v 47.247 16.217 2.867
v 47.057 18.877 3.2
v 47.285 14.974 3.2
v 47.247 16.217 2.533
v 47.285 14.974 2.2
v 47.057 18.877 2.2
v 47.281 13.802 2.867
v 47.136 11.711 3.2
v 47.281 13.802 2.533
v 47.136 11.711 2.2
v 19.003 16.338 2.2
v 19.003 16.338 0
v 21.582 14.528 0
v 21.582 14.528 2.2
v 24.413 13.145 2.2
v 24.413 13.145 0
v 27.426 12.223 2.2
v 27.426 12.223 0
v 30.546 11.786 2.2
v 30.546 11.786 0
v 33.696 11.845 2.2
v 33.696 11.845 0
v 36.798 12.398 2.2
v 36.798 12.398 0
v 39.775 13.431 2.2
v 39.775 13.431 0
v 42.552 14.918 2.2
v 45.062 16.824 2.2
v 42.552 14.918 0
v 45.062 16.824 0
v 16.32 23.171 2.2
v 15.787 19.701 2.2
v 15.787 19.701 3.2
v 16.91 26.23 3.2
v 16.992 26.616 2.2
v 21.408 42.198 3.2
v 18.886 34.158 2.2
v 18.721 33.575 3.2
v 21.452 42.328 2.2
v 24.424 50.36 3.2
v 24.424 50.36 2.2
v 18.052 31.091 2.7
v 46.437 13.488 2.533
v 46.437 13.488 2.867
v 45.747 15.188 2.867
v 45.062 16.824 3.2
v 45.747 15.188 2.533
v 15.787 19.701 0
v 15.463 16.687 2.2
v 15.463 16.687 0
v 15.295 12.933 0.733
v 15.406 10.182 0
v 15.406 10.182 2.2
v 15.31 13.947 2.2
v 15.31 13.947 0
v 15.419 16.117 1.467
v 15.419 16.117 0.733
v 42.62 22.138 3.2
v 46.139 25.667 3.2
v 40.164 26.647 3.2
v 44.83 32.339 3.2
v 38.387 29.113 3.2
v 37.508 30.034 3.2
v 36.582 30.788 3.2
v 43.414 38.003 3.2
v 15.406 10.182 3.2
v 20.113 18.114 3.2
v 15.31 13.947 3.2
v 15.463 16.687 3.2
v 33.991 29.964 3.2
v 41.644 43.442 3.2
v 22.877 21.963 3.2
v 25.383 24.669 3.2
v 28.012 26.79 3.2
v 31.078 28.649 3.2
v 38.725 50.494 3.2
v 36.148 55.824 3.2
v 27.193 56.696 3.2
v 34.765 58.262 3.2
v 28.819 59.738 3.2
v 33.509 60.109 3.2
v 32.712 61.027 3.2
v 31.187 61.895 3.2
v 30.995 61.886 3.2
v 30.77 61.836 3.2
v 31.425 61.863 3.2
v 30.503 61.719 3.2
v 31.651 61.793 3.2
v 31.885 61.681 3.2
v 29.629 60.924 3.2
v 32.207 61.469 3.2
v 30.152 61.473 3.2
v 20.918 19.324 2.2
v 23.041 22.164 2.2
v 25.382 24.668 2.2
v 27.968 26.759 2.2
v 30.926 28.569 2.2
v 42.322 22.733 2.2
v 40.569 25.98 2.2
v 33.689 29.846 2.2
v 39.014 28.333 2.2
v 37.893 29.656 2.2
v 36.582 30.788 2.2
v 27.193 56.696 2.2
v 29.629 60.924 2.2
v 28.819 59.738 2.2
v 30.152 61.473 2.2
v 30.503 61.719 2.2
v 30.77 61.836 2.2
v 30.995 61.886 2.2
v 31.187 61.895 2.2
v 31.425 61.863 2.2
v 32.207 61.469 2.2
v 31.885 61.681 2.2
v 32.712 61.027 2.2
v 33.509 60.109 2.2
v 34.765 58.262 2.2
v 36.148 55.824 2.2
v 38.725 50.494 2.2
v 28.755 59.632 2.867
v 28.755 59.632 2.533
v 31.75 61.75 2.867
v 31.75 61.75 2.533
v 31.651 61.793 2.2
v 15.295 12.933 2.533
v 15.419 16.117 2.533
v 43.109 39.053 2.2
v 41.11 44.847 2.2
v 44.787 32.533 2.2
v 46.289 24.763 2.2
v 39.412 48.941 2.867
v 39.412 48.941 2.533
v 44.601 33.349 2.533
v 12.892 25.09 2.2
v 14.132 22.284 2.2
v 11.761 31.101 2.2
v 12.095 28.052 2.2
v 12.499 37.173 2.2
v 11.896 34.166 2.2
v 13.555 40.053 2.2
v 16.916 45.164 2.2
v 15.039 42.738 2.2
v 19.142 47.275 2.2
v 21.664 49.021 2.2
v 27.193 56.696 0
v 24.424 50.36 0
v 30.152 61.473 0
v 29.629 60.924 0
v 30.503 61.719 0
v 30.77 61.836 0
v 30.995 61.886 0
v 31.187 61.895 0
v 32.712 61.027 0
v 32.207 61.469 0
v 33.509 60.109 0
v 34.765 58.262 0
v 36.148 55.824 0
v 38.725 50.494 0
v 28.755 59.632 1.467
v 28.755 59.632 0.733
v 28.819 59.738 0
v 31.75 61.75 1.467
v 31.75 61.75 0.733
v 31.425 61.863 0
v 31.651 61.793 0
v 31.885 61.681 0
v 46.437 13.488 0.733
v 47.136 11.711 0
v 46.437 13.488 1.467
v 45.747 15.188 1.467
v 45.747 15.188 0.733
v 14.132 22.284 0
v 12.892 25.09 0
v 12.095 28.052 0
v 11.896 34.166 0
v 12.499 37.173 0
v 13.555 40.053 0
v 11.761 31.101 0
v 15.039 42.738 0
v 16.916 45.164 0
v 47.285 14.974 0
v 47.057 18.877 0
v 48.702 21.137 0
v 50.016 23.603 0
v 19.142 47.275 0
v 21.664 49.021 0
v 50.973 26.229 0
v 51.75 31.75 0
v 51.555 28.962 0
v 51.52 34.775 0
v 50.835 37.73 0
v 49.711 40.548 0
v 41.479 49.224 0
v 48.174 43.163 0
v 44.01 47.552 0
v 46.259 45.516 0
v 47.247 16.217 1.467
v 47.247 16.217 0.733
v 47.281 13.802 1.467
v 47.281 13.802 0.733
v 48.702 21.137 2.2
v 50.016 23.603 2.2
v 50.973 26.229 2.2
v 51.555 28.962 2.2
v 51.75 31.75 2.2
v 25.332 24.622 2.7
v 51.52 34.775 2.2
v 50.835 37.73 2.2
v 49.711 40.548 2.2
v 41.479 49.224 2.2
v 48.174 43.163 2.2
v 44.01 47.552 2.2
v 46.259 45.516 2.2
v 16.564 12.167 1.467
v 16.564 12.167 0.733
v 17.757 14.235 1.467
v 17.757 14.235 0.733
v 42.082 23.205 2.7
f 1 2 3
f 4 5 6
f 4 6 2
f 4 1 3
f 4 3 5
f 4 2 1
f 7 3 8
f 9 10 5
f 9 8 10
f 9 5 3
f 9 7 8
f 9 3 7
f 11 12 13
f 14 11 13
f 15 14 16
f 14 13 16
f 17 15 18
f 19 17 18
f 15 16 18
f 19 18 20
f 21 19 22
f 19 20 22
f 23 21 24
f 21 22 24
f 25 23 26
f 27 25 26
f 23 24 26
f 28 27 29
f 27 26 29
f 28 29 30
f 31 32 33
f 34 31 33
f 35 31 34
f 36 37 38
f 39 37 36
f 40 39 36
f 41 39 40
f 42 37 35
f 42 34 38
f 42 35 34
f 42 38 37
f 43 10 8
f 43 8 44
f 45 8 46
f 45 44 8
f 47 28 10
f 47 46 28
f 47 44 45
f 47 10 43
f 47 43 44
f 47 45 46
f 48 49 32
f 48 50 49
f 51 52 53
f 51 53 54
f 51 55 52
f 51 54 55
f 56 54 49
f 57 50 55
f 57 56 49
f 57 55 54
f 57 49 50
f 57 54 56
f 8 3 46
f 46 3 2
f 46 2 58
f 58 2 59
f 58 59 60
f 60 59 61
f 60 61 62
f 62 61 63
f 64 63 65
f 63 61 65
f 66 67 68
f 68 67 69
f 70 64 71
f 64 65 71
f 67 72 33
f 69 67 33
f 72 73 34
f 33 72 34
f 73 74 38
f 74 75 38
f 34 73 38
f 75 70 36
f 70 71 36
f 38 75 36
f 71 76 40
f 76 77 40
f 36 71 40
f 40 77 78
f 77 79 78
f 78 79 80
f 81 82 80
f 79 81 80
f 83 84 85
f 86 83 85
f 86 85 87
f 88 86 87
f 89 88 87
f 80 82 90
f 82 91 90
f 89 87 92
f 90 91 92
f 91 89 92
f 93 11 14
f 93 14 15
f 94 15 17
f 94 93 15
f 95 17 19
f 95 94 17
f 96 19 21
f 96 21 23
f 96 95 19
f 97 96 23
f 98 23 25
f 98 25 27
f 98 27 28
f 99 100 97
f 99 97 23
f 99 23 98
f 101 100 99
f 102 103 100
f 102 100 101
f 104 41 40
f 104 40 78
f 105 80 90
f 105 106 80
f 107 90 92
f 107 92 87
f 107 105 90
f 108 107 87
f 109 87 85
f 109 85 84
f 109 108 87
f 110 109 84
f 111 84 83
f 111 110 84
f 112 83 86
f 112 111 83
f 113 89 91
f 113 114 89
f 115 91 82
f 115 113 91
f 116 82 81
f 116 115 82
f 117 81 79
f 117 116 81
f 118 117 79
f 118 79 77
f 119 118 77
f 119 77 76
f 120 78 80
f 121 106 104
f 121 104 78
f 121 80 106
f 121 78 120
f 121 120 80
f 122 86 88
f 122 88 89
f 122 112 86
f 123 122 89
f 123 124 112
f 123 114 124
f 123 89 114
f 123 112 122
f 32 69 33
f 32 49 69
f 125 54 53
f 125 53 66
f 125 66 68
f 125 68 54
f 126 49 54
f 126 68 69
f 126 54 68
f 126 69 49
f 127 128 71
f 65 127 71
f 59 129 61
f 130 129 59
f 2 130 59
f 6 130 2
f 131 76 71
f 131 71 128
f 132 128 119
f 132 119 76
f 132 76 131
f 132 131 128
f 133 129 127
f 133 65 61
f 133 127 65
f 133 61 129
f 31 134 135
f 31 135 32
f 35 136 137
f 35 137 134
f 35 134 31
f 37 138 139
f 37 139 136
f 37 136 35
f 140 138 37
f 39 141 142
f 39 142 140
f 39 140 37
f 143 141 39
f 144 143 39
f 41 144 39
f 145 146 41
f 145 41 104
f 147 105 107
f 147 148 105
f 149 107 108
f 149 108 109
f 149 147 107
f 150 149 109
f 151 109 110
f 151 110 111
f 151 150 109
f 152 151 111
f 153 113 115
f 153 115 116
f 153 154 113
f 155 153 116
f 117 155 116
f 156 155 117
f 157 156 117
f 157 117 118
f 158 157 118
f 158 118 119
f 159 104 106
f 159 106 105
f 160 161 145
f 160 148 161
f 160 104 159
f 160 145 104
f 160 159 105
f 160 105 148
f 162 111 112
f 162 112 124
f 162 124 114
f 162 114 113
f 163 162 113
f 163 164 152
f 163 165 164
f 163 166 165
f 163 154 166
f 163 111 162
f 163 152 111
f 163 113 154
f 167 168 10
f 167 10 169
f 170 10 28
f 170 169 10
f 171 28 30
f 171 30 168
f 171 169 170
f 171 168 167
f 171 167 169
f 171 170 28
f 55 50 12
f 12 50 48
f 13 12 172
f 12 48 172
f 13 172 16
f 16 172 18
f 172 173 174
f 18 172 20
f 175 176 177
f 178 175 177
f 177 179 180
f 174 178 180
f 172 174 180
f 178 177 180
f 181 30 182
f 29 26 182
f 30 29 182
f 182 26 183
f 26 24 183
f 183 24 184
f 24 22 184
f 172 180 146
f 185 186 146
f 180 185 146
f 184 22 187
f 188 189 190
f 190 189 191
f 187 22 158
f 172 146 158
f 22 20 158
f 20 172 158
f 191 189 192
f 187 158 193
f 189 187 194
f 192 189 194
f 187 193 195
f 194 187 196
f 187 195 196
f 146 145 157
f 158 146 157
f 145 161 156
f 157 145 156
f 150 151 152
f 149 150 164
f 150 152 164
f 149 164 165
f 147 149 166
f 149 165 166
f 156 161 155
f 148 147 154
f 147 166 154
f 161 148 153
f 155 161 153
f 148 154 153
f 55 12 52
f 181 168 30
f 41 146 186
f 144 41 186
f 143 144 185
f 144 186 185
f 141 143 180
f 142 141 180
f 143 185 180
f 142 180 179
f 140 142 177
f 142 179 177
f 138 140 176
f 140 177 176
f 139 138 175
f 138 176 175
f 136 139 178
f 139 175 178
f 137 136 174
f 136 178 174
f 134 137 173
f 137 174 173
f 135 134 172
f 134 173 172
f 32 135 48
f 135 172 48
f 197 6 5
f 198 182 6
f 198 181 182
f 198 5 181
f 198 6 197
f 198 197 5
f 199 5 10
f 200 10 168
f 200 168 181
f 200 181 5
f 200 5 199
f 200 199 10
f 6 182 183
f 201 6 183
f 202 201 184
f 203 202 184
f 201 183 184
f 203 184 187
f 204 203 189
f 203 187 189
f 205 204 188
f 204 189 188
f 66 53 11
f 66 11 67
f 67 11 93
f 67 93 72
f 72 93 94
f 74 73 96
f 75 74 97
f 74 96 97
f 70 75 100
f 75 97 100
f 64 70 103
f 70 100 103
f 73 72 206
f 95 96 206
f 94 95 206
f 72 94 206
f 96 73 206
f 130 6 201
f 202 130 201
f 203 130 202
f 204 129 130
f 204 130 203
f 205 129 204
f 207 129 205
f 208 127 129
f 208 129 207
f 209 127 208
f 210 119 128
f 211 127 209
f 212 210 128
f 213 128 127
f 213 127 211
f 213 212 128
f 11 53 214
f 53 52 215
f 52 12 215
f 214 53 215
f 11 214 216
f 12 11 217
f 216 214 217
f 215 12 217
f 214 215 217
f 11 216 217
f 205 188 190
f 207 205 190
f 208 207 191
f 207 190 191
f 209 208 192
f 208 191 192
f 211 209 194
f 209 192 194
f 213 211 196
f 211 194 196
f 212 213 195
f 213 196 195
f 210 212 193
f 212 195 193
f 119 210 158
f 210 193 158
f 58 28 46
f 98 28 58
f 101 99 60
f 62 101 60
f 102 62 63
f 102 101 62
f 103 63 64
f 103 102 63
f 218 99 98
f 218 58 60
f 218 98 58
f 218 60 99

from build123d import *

# Parameters (mm, degrees)
F1_DEPTH = 2.2
F2_DEPTH = 3.2


with BuildPart() as f1:
    # F0 (on Top) → F1 (new body)
    with BuildSketch(Plane.XY):
        with BuildLine():
            ThreePointArc((47.0567276318, 18.8773899614), (50.5400845213, 24.8992537865), (51.75, 31.75))
            ThreePointArc((51.75, 31.75), (48.1739643306, 43.1628609764), (38.7246604334, 50.4944421586))
            add(Edge.make_bspline(
                [(38.7246604334, 50.4944421586), (38.9609346181, 49.9686786288), (41.6774554399, 43.8176291657), (44.2250191929, 36.4340414246), (46.6159564174, 23.5665925252), (47.0567276318, 18.8773899614)],
                knots=[0.630442373, 0.630442373, 0.630442373, 0.630442373, 0.6456439018, 0.8103538291, 0.929794225, 0.929794225, 0.929794225, 0.929794225], degree=3))
        make_face()
        with BuildLine():
            add(Edge.make_bspline(
                [(38.7246604334, 50.4944421586), (38.9609346181, 49.9686786288), (41.6774554399, 43.8176291657), (44.2250191929, 36.4340414246), (46.6159564174, 23.5665925252), (47.0567276318, 18.8773899614)],
                knots=[0.630442373, 0.630442373, 0.630442373, 0.630442373, 0.6456439018, 0.8103538291, 0.929794225, 0.929794225, 0.929794225, 0.929794225], degree=3))
            ThreePointArc((38.7246604334, 50.4944421586), (31.5618373499, 51.7491148508), (24.4238894806, 50.3598926557))
            add(Edge.make_bspline(
                [(15.7865923671, 19.7013645276), (16.2278990367, 23.0877163293), (18.1065072741, 32.7418176771), (22.097534659, 44.5584231861), (24.4238894806, 50.3598926557)],
                knots=[0.0983218299, 0.0983218299, 0.0983218299, 0.0983218299, 0.1865319985, 0.3205820871, 0.3205820871, 0.3205820871, 0.3205820871], degree=3))
            ThreePointArc((15.7865923672, 19.7013645276), (17.2967492534, 17.9259794974), (19.0032017299, 16.3383442206))
            add(Edge.make_bspline(
                [(19.0032017299, 16.3383442206), (20.8233538612, 19.3366897096), (25.818648602, 26.6169979909), (33.4803777859, 30.0196222141), (36.5823023021, 30.7882130146)],
                knots=[0.2222997297, 0.2222997297, 0.2222997297, 0.2222997297, 0.5388931801, 1, 1, 1, 1], degree=3))
            add(Edge.make_bspline(
                [(45.0616821781, 16.8235430329), (44.1054826127, 19.0614489649), (41.7058120017, 24.2306114406), (38.7451071997, 29.2835529549), (36.5823023021, 30.7882130146)],
                knots=[0.2242106798, 0.2242106798, 0.2242106798, 0.2242106798, 0.5365477963, 1, 1, 1, 1], degree=3))
            ThreePointArc((45.0616821781, 16.8235430329), (46.0960069989, 17.8147180442), (47.0567276318, 18.8773899614))
        make_face()
        with BuildLine():
            ThreePointArc((24.4238894806, 50.3598926557), (31.5618373499, 51.7491148508), (38.7246604334, 50.4944421586))
            add(Edge.make_bspline(
                [(24.4238894806, 50.3598926557), (25.9905275085, 54.2667784859), (28.8395118431, 60.4223481909), (32.1998298153, 63.8051247243), (36.5212033159, 55.3976328882), (38.7246604334, 50.4944421586)],
                knots=[0.3205820871, 0.3205820871, 0.3205820871, 0.3205820871, 0.4108554902, 0.4886752267, 0.630442373, 0.630442373, 0.630442373, 0.630442373], degree=3))
        make_face()
        with BuildLine():
            add(Edge.make_bspline(
                [(47.0567276318, 18.8773899614), (47.3158081923, 16.1211273275), (47.379945731, 13.6134596383), (47.1355328849, 11.710731416)],
                knots=[0.929794225, 0.929794225, 0.929794225, 0.929794225, 1, 1, 1, 1], degree=3))
            ThreePointArc((47.0567276318, 18.8773899614), (46.0960069989, 17.8147180442), (45.0616821781, 16.8235430329))
            add(Edge.make_bspline(
                [(47.1355328849, 11.710731416), (46.4293822406, 13.5298032206), (45.7480884465, 15.2170659798), (45.0616821781, 16.8235430329)],
                knots=[0, 0, 0, 0, 0.2242106798, 0.2242106798, 0.2242106798, 0.2242106798], degree=3))
        make_face()
        with BuildLine():
            add(Edge.make_bspline(
                [(15.7865923671, 19.7013645276), (16.2278990367, 23.0877163293), (18.1065072741, 32.7418176771), (22.097534659, 44.5584231861), (24.4238894806, 50.3598926557)],
                knots=[0.0983218299, 0.0983218299, 0.0983218299, 0.0983218299, 0.1865319985, 0.3205820871, 0.3205820871, 0.3205820871, 0.3205820871], degree=3))
            ThreePointArc((24.4238894806, 50.3598926557), (12.4993701223, 37.1733983178), (15.7865923672, 19.7013645276))
        make_face()
        with BuildLine():
            ThreePointArc((19.0032017299, 16.3383442206), (32.1223277175, 11.7534659986), (45.0616821781, 16.8235430329))
            add(Edge.make_bspline(
                [(45.0616821781, 16.8235430329), (44.1054826127, 19.0614489649), (41.7058120017, 24.2306114406), (38.7451071997, 29.2835529549), (36.5823023021, 30.7882130146)],
                knots=[0.2242106798, 0.2242106798, 0.2242106798, 0.2242106798, 0.5365477963, 1, 1, 1, 1], degree=3))
            add(Edge.make_bspline(
                [(19.0032017299, 16.3383442206), (20.8233538612, 19.3366897096), (25.818648602, 26.6169979909), (33.4803777859, 30.0196222141), (36.5823023021, 30.7882130146)],
                knots=[0.2222997297, 0.2222997297, 0.2222997297, 0.2222997297, 0.5388931801, 1, 1, 1, 1], degree=3))
        make_face()
        with BuildLine():
            ThreePointArc((19.0032017299, 16.3383442206), (17.2967492534, 17.9259794974), (15.7865923672, 19.7013645276))
            add(Edge.make_bspline(
                [(15.4055802766, 10.1816686965), (15.180831424, 12.7053480538), (15.2946980654, 15.9268302417), (15.7865923671, 19.7013645276)],
                knots=[0, 0, 0, 0, 0.0983218299, 0.0983218299, 0.0983218299, 0.0983218299], degree=3))
            add(Edge.make_bspline(
                [(15.4055802766, 10.1816686965), (16.5523225946, 12.1106349554), (17.7251609925, 14.2330214765), (19.0032017299, 16.3383442206)],
                knots=[0, 0, 0, 0, 0.2222997297, 0.2222997297, 0.2222997297, 0.2222997297], degree=3))
        make_face()
    extrude(amount=F1_DEPTH)

    # F0 (on Top) → F2 (join)
    with BuildSketch(Plane.XY):
        with BuildLine():
            add(Edge.make_bspline(
                [(38.7246604334, 50.4944421586), (38.9609346181, 49.9686786288), (41.6774554399, 43.8176291657), (44.2250191929, 36.4340414246), (46.6159564174, 23.5665925252), (47.0567276318, 18.8773899614)],
                knots=[0.630442373, 0.630442373, 0.630442373, 0.630442373, 0.6456439018, 0.8103538291, 0.929794225, 0.929794225, 0.929794225, 0.929794225], degree=3))
            ThreePointArc((38.7246604334, 50.4944421586), (31.5618373499, 51.7491148508), (24.4238894806, 50.3598926557))
            add(Edge.make_bspline(
                [(15.7865923671, 19.7013645276), (16.2278990367, 23.0877163293), (18.1065072741, 32.7418176771), (22.097534659, 44.5584231861), (24.4238894806, 50.3598926557)],
                knots=[0.0983218299, 0.0983218299, 0.0983218299, 0.0983218299, 0.1865319985, 0.3205820871, 0.3205820871, 0.3205820871, 0.3205820871], degree=3))
            ThreePointArc((15.7865923672, 19.7013645276), (17.2967492534, 17.9259794974), (19.0032017299, 16.3383442206))
            add(Edge.make_bspline(
                [(19.0032017299, 16.3383442206), (20.8233538612, 19.3366897096), (25.818648602, 26.6169979909), (33.4803777859, 30.0196222141), (36.5823023021, 30.7882130146)],
                knots=[0.2222997297, 0.2222997297, 0.2222997297, 0.2222997297, 0.5388931801, 1, 1, 1, 1], degree=3))
            add(Edge.make_bspline(
                [(45.0616821781, 16.8235430329), (44.1054826127, 19.0614489649), (41.7058120017, 24.2306114406), (38.7451071997, 29.2835529549), (36.5823023021, 30.7882130146)],
                knots=[0.2242106798, 0.2242106798, 0.2242106798, 0.2242106798, 0.5365477963, 1, 1, 1, 1], degree=3))
            ThreePointArc((45.0616821781, 16.8235430329), (46.0960069989, 17.8147180442), (47.0567276318, 18.8773899614))
        make_face()
        with BuildLine():
            ThreePointArc((24.4238894806, 50.3598926557), (31.5618373499, 51.7491148508), (38.7246604334, 50.4944421586))
            add(Edge.make_bspline(
                [(24.4238894806, 50.3598926557), (25.9905275085, 54.2667784859), (28.8395118431, 60.4223481909), (32.1998298153, 63.8051247243), (36.5212033159, 55.3976328882), (38.7246604334, 50.4944421586)],
                knots=[0.3205820871, 0.3205820871, 0.3205820871, 0.3205820871, 0.4108554902, 0.4886752267, 0.630442373, 0.630442373, 0.630442373, 0.630442373], degree=3))
        make_face()
        with BuildLine():
            add(Edge.make_bspline(
                [(47.0567276318, 18.8773899614), (47.3158081923, 16.1211273275), (47.379945731, 13.6134596383), (47.1355328849, 11.710731416)],
                knots=[0.929794225, 0.929794225, 0.929794225, 0.929794225, 1, 1, 1, 1], degree=3))
            ThreePointArc((47.0567276318, 18.8773899614), (46.0960069989, 17.8147180442), (45.0616821781, 16.8235430329))
            add(Edge.make_bspline(
                [(47.1355328849, 11.710731416), (46.4293822406, 13.5298032206), (45.7480884465, 15.2170659798), (45.0616821781, 16.8235430329)],
                knots=[0, 0, 0, 0, 0.2242106798, 0.2242106798, 0.2242106798, 0.2242106798], degree=3))
        make_face()
        with BuildLine():
            ThreePointArc((19.0032017299, 16.3383442206), (17.2967492534, 17.9259794974), (15.7865923672, 19.7013645276))
            add(Edge.make_bspline(
                [(15.4055802766, 10.1816686965), (15.180831424, 12.7053480538), (15.2946980654, 15.9268302417), (15.7865923671, 19.7013645276)],
                knots=[0, 0, 0, 0, 0.0983218299, 0.0983218299, 0.0983218299, 0.0983218299], degree=3))
            add(Edge.make_bspline(
                [(15.4055802766, 10.1816686965), (16.5523225946, 12.1106349554), (17.7251609925, 14.2330214765), (19.0032017299, 16.3383442206)],
                knots=[0, 0, 0, 0, 0.2222997297, 0.2222997297, 0.2222997297, 0.2222997297], degree=3))
        make_face()
    extrude(amount=F2_DEPTH)


solid = f1.part
